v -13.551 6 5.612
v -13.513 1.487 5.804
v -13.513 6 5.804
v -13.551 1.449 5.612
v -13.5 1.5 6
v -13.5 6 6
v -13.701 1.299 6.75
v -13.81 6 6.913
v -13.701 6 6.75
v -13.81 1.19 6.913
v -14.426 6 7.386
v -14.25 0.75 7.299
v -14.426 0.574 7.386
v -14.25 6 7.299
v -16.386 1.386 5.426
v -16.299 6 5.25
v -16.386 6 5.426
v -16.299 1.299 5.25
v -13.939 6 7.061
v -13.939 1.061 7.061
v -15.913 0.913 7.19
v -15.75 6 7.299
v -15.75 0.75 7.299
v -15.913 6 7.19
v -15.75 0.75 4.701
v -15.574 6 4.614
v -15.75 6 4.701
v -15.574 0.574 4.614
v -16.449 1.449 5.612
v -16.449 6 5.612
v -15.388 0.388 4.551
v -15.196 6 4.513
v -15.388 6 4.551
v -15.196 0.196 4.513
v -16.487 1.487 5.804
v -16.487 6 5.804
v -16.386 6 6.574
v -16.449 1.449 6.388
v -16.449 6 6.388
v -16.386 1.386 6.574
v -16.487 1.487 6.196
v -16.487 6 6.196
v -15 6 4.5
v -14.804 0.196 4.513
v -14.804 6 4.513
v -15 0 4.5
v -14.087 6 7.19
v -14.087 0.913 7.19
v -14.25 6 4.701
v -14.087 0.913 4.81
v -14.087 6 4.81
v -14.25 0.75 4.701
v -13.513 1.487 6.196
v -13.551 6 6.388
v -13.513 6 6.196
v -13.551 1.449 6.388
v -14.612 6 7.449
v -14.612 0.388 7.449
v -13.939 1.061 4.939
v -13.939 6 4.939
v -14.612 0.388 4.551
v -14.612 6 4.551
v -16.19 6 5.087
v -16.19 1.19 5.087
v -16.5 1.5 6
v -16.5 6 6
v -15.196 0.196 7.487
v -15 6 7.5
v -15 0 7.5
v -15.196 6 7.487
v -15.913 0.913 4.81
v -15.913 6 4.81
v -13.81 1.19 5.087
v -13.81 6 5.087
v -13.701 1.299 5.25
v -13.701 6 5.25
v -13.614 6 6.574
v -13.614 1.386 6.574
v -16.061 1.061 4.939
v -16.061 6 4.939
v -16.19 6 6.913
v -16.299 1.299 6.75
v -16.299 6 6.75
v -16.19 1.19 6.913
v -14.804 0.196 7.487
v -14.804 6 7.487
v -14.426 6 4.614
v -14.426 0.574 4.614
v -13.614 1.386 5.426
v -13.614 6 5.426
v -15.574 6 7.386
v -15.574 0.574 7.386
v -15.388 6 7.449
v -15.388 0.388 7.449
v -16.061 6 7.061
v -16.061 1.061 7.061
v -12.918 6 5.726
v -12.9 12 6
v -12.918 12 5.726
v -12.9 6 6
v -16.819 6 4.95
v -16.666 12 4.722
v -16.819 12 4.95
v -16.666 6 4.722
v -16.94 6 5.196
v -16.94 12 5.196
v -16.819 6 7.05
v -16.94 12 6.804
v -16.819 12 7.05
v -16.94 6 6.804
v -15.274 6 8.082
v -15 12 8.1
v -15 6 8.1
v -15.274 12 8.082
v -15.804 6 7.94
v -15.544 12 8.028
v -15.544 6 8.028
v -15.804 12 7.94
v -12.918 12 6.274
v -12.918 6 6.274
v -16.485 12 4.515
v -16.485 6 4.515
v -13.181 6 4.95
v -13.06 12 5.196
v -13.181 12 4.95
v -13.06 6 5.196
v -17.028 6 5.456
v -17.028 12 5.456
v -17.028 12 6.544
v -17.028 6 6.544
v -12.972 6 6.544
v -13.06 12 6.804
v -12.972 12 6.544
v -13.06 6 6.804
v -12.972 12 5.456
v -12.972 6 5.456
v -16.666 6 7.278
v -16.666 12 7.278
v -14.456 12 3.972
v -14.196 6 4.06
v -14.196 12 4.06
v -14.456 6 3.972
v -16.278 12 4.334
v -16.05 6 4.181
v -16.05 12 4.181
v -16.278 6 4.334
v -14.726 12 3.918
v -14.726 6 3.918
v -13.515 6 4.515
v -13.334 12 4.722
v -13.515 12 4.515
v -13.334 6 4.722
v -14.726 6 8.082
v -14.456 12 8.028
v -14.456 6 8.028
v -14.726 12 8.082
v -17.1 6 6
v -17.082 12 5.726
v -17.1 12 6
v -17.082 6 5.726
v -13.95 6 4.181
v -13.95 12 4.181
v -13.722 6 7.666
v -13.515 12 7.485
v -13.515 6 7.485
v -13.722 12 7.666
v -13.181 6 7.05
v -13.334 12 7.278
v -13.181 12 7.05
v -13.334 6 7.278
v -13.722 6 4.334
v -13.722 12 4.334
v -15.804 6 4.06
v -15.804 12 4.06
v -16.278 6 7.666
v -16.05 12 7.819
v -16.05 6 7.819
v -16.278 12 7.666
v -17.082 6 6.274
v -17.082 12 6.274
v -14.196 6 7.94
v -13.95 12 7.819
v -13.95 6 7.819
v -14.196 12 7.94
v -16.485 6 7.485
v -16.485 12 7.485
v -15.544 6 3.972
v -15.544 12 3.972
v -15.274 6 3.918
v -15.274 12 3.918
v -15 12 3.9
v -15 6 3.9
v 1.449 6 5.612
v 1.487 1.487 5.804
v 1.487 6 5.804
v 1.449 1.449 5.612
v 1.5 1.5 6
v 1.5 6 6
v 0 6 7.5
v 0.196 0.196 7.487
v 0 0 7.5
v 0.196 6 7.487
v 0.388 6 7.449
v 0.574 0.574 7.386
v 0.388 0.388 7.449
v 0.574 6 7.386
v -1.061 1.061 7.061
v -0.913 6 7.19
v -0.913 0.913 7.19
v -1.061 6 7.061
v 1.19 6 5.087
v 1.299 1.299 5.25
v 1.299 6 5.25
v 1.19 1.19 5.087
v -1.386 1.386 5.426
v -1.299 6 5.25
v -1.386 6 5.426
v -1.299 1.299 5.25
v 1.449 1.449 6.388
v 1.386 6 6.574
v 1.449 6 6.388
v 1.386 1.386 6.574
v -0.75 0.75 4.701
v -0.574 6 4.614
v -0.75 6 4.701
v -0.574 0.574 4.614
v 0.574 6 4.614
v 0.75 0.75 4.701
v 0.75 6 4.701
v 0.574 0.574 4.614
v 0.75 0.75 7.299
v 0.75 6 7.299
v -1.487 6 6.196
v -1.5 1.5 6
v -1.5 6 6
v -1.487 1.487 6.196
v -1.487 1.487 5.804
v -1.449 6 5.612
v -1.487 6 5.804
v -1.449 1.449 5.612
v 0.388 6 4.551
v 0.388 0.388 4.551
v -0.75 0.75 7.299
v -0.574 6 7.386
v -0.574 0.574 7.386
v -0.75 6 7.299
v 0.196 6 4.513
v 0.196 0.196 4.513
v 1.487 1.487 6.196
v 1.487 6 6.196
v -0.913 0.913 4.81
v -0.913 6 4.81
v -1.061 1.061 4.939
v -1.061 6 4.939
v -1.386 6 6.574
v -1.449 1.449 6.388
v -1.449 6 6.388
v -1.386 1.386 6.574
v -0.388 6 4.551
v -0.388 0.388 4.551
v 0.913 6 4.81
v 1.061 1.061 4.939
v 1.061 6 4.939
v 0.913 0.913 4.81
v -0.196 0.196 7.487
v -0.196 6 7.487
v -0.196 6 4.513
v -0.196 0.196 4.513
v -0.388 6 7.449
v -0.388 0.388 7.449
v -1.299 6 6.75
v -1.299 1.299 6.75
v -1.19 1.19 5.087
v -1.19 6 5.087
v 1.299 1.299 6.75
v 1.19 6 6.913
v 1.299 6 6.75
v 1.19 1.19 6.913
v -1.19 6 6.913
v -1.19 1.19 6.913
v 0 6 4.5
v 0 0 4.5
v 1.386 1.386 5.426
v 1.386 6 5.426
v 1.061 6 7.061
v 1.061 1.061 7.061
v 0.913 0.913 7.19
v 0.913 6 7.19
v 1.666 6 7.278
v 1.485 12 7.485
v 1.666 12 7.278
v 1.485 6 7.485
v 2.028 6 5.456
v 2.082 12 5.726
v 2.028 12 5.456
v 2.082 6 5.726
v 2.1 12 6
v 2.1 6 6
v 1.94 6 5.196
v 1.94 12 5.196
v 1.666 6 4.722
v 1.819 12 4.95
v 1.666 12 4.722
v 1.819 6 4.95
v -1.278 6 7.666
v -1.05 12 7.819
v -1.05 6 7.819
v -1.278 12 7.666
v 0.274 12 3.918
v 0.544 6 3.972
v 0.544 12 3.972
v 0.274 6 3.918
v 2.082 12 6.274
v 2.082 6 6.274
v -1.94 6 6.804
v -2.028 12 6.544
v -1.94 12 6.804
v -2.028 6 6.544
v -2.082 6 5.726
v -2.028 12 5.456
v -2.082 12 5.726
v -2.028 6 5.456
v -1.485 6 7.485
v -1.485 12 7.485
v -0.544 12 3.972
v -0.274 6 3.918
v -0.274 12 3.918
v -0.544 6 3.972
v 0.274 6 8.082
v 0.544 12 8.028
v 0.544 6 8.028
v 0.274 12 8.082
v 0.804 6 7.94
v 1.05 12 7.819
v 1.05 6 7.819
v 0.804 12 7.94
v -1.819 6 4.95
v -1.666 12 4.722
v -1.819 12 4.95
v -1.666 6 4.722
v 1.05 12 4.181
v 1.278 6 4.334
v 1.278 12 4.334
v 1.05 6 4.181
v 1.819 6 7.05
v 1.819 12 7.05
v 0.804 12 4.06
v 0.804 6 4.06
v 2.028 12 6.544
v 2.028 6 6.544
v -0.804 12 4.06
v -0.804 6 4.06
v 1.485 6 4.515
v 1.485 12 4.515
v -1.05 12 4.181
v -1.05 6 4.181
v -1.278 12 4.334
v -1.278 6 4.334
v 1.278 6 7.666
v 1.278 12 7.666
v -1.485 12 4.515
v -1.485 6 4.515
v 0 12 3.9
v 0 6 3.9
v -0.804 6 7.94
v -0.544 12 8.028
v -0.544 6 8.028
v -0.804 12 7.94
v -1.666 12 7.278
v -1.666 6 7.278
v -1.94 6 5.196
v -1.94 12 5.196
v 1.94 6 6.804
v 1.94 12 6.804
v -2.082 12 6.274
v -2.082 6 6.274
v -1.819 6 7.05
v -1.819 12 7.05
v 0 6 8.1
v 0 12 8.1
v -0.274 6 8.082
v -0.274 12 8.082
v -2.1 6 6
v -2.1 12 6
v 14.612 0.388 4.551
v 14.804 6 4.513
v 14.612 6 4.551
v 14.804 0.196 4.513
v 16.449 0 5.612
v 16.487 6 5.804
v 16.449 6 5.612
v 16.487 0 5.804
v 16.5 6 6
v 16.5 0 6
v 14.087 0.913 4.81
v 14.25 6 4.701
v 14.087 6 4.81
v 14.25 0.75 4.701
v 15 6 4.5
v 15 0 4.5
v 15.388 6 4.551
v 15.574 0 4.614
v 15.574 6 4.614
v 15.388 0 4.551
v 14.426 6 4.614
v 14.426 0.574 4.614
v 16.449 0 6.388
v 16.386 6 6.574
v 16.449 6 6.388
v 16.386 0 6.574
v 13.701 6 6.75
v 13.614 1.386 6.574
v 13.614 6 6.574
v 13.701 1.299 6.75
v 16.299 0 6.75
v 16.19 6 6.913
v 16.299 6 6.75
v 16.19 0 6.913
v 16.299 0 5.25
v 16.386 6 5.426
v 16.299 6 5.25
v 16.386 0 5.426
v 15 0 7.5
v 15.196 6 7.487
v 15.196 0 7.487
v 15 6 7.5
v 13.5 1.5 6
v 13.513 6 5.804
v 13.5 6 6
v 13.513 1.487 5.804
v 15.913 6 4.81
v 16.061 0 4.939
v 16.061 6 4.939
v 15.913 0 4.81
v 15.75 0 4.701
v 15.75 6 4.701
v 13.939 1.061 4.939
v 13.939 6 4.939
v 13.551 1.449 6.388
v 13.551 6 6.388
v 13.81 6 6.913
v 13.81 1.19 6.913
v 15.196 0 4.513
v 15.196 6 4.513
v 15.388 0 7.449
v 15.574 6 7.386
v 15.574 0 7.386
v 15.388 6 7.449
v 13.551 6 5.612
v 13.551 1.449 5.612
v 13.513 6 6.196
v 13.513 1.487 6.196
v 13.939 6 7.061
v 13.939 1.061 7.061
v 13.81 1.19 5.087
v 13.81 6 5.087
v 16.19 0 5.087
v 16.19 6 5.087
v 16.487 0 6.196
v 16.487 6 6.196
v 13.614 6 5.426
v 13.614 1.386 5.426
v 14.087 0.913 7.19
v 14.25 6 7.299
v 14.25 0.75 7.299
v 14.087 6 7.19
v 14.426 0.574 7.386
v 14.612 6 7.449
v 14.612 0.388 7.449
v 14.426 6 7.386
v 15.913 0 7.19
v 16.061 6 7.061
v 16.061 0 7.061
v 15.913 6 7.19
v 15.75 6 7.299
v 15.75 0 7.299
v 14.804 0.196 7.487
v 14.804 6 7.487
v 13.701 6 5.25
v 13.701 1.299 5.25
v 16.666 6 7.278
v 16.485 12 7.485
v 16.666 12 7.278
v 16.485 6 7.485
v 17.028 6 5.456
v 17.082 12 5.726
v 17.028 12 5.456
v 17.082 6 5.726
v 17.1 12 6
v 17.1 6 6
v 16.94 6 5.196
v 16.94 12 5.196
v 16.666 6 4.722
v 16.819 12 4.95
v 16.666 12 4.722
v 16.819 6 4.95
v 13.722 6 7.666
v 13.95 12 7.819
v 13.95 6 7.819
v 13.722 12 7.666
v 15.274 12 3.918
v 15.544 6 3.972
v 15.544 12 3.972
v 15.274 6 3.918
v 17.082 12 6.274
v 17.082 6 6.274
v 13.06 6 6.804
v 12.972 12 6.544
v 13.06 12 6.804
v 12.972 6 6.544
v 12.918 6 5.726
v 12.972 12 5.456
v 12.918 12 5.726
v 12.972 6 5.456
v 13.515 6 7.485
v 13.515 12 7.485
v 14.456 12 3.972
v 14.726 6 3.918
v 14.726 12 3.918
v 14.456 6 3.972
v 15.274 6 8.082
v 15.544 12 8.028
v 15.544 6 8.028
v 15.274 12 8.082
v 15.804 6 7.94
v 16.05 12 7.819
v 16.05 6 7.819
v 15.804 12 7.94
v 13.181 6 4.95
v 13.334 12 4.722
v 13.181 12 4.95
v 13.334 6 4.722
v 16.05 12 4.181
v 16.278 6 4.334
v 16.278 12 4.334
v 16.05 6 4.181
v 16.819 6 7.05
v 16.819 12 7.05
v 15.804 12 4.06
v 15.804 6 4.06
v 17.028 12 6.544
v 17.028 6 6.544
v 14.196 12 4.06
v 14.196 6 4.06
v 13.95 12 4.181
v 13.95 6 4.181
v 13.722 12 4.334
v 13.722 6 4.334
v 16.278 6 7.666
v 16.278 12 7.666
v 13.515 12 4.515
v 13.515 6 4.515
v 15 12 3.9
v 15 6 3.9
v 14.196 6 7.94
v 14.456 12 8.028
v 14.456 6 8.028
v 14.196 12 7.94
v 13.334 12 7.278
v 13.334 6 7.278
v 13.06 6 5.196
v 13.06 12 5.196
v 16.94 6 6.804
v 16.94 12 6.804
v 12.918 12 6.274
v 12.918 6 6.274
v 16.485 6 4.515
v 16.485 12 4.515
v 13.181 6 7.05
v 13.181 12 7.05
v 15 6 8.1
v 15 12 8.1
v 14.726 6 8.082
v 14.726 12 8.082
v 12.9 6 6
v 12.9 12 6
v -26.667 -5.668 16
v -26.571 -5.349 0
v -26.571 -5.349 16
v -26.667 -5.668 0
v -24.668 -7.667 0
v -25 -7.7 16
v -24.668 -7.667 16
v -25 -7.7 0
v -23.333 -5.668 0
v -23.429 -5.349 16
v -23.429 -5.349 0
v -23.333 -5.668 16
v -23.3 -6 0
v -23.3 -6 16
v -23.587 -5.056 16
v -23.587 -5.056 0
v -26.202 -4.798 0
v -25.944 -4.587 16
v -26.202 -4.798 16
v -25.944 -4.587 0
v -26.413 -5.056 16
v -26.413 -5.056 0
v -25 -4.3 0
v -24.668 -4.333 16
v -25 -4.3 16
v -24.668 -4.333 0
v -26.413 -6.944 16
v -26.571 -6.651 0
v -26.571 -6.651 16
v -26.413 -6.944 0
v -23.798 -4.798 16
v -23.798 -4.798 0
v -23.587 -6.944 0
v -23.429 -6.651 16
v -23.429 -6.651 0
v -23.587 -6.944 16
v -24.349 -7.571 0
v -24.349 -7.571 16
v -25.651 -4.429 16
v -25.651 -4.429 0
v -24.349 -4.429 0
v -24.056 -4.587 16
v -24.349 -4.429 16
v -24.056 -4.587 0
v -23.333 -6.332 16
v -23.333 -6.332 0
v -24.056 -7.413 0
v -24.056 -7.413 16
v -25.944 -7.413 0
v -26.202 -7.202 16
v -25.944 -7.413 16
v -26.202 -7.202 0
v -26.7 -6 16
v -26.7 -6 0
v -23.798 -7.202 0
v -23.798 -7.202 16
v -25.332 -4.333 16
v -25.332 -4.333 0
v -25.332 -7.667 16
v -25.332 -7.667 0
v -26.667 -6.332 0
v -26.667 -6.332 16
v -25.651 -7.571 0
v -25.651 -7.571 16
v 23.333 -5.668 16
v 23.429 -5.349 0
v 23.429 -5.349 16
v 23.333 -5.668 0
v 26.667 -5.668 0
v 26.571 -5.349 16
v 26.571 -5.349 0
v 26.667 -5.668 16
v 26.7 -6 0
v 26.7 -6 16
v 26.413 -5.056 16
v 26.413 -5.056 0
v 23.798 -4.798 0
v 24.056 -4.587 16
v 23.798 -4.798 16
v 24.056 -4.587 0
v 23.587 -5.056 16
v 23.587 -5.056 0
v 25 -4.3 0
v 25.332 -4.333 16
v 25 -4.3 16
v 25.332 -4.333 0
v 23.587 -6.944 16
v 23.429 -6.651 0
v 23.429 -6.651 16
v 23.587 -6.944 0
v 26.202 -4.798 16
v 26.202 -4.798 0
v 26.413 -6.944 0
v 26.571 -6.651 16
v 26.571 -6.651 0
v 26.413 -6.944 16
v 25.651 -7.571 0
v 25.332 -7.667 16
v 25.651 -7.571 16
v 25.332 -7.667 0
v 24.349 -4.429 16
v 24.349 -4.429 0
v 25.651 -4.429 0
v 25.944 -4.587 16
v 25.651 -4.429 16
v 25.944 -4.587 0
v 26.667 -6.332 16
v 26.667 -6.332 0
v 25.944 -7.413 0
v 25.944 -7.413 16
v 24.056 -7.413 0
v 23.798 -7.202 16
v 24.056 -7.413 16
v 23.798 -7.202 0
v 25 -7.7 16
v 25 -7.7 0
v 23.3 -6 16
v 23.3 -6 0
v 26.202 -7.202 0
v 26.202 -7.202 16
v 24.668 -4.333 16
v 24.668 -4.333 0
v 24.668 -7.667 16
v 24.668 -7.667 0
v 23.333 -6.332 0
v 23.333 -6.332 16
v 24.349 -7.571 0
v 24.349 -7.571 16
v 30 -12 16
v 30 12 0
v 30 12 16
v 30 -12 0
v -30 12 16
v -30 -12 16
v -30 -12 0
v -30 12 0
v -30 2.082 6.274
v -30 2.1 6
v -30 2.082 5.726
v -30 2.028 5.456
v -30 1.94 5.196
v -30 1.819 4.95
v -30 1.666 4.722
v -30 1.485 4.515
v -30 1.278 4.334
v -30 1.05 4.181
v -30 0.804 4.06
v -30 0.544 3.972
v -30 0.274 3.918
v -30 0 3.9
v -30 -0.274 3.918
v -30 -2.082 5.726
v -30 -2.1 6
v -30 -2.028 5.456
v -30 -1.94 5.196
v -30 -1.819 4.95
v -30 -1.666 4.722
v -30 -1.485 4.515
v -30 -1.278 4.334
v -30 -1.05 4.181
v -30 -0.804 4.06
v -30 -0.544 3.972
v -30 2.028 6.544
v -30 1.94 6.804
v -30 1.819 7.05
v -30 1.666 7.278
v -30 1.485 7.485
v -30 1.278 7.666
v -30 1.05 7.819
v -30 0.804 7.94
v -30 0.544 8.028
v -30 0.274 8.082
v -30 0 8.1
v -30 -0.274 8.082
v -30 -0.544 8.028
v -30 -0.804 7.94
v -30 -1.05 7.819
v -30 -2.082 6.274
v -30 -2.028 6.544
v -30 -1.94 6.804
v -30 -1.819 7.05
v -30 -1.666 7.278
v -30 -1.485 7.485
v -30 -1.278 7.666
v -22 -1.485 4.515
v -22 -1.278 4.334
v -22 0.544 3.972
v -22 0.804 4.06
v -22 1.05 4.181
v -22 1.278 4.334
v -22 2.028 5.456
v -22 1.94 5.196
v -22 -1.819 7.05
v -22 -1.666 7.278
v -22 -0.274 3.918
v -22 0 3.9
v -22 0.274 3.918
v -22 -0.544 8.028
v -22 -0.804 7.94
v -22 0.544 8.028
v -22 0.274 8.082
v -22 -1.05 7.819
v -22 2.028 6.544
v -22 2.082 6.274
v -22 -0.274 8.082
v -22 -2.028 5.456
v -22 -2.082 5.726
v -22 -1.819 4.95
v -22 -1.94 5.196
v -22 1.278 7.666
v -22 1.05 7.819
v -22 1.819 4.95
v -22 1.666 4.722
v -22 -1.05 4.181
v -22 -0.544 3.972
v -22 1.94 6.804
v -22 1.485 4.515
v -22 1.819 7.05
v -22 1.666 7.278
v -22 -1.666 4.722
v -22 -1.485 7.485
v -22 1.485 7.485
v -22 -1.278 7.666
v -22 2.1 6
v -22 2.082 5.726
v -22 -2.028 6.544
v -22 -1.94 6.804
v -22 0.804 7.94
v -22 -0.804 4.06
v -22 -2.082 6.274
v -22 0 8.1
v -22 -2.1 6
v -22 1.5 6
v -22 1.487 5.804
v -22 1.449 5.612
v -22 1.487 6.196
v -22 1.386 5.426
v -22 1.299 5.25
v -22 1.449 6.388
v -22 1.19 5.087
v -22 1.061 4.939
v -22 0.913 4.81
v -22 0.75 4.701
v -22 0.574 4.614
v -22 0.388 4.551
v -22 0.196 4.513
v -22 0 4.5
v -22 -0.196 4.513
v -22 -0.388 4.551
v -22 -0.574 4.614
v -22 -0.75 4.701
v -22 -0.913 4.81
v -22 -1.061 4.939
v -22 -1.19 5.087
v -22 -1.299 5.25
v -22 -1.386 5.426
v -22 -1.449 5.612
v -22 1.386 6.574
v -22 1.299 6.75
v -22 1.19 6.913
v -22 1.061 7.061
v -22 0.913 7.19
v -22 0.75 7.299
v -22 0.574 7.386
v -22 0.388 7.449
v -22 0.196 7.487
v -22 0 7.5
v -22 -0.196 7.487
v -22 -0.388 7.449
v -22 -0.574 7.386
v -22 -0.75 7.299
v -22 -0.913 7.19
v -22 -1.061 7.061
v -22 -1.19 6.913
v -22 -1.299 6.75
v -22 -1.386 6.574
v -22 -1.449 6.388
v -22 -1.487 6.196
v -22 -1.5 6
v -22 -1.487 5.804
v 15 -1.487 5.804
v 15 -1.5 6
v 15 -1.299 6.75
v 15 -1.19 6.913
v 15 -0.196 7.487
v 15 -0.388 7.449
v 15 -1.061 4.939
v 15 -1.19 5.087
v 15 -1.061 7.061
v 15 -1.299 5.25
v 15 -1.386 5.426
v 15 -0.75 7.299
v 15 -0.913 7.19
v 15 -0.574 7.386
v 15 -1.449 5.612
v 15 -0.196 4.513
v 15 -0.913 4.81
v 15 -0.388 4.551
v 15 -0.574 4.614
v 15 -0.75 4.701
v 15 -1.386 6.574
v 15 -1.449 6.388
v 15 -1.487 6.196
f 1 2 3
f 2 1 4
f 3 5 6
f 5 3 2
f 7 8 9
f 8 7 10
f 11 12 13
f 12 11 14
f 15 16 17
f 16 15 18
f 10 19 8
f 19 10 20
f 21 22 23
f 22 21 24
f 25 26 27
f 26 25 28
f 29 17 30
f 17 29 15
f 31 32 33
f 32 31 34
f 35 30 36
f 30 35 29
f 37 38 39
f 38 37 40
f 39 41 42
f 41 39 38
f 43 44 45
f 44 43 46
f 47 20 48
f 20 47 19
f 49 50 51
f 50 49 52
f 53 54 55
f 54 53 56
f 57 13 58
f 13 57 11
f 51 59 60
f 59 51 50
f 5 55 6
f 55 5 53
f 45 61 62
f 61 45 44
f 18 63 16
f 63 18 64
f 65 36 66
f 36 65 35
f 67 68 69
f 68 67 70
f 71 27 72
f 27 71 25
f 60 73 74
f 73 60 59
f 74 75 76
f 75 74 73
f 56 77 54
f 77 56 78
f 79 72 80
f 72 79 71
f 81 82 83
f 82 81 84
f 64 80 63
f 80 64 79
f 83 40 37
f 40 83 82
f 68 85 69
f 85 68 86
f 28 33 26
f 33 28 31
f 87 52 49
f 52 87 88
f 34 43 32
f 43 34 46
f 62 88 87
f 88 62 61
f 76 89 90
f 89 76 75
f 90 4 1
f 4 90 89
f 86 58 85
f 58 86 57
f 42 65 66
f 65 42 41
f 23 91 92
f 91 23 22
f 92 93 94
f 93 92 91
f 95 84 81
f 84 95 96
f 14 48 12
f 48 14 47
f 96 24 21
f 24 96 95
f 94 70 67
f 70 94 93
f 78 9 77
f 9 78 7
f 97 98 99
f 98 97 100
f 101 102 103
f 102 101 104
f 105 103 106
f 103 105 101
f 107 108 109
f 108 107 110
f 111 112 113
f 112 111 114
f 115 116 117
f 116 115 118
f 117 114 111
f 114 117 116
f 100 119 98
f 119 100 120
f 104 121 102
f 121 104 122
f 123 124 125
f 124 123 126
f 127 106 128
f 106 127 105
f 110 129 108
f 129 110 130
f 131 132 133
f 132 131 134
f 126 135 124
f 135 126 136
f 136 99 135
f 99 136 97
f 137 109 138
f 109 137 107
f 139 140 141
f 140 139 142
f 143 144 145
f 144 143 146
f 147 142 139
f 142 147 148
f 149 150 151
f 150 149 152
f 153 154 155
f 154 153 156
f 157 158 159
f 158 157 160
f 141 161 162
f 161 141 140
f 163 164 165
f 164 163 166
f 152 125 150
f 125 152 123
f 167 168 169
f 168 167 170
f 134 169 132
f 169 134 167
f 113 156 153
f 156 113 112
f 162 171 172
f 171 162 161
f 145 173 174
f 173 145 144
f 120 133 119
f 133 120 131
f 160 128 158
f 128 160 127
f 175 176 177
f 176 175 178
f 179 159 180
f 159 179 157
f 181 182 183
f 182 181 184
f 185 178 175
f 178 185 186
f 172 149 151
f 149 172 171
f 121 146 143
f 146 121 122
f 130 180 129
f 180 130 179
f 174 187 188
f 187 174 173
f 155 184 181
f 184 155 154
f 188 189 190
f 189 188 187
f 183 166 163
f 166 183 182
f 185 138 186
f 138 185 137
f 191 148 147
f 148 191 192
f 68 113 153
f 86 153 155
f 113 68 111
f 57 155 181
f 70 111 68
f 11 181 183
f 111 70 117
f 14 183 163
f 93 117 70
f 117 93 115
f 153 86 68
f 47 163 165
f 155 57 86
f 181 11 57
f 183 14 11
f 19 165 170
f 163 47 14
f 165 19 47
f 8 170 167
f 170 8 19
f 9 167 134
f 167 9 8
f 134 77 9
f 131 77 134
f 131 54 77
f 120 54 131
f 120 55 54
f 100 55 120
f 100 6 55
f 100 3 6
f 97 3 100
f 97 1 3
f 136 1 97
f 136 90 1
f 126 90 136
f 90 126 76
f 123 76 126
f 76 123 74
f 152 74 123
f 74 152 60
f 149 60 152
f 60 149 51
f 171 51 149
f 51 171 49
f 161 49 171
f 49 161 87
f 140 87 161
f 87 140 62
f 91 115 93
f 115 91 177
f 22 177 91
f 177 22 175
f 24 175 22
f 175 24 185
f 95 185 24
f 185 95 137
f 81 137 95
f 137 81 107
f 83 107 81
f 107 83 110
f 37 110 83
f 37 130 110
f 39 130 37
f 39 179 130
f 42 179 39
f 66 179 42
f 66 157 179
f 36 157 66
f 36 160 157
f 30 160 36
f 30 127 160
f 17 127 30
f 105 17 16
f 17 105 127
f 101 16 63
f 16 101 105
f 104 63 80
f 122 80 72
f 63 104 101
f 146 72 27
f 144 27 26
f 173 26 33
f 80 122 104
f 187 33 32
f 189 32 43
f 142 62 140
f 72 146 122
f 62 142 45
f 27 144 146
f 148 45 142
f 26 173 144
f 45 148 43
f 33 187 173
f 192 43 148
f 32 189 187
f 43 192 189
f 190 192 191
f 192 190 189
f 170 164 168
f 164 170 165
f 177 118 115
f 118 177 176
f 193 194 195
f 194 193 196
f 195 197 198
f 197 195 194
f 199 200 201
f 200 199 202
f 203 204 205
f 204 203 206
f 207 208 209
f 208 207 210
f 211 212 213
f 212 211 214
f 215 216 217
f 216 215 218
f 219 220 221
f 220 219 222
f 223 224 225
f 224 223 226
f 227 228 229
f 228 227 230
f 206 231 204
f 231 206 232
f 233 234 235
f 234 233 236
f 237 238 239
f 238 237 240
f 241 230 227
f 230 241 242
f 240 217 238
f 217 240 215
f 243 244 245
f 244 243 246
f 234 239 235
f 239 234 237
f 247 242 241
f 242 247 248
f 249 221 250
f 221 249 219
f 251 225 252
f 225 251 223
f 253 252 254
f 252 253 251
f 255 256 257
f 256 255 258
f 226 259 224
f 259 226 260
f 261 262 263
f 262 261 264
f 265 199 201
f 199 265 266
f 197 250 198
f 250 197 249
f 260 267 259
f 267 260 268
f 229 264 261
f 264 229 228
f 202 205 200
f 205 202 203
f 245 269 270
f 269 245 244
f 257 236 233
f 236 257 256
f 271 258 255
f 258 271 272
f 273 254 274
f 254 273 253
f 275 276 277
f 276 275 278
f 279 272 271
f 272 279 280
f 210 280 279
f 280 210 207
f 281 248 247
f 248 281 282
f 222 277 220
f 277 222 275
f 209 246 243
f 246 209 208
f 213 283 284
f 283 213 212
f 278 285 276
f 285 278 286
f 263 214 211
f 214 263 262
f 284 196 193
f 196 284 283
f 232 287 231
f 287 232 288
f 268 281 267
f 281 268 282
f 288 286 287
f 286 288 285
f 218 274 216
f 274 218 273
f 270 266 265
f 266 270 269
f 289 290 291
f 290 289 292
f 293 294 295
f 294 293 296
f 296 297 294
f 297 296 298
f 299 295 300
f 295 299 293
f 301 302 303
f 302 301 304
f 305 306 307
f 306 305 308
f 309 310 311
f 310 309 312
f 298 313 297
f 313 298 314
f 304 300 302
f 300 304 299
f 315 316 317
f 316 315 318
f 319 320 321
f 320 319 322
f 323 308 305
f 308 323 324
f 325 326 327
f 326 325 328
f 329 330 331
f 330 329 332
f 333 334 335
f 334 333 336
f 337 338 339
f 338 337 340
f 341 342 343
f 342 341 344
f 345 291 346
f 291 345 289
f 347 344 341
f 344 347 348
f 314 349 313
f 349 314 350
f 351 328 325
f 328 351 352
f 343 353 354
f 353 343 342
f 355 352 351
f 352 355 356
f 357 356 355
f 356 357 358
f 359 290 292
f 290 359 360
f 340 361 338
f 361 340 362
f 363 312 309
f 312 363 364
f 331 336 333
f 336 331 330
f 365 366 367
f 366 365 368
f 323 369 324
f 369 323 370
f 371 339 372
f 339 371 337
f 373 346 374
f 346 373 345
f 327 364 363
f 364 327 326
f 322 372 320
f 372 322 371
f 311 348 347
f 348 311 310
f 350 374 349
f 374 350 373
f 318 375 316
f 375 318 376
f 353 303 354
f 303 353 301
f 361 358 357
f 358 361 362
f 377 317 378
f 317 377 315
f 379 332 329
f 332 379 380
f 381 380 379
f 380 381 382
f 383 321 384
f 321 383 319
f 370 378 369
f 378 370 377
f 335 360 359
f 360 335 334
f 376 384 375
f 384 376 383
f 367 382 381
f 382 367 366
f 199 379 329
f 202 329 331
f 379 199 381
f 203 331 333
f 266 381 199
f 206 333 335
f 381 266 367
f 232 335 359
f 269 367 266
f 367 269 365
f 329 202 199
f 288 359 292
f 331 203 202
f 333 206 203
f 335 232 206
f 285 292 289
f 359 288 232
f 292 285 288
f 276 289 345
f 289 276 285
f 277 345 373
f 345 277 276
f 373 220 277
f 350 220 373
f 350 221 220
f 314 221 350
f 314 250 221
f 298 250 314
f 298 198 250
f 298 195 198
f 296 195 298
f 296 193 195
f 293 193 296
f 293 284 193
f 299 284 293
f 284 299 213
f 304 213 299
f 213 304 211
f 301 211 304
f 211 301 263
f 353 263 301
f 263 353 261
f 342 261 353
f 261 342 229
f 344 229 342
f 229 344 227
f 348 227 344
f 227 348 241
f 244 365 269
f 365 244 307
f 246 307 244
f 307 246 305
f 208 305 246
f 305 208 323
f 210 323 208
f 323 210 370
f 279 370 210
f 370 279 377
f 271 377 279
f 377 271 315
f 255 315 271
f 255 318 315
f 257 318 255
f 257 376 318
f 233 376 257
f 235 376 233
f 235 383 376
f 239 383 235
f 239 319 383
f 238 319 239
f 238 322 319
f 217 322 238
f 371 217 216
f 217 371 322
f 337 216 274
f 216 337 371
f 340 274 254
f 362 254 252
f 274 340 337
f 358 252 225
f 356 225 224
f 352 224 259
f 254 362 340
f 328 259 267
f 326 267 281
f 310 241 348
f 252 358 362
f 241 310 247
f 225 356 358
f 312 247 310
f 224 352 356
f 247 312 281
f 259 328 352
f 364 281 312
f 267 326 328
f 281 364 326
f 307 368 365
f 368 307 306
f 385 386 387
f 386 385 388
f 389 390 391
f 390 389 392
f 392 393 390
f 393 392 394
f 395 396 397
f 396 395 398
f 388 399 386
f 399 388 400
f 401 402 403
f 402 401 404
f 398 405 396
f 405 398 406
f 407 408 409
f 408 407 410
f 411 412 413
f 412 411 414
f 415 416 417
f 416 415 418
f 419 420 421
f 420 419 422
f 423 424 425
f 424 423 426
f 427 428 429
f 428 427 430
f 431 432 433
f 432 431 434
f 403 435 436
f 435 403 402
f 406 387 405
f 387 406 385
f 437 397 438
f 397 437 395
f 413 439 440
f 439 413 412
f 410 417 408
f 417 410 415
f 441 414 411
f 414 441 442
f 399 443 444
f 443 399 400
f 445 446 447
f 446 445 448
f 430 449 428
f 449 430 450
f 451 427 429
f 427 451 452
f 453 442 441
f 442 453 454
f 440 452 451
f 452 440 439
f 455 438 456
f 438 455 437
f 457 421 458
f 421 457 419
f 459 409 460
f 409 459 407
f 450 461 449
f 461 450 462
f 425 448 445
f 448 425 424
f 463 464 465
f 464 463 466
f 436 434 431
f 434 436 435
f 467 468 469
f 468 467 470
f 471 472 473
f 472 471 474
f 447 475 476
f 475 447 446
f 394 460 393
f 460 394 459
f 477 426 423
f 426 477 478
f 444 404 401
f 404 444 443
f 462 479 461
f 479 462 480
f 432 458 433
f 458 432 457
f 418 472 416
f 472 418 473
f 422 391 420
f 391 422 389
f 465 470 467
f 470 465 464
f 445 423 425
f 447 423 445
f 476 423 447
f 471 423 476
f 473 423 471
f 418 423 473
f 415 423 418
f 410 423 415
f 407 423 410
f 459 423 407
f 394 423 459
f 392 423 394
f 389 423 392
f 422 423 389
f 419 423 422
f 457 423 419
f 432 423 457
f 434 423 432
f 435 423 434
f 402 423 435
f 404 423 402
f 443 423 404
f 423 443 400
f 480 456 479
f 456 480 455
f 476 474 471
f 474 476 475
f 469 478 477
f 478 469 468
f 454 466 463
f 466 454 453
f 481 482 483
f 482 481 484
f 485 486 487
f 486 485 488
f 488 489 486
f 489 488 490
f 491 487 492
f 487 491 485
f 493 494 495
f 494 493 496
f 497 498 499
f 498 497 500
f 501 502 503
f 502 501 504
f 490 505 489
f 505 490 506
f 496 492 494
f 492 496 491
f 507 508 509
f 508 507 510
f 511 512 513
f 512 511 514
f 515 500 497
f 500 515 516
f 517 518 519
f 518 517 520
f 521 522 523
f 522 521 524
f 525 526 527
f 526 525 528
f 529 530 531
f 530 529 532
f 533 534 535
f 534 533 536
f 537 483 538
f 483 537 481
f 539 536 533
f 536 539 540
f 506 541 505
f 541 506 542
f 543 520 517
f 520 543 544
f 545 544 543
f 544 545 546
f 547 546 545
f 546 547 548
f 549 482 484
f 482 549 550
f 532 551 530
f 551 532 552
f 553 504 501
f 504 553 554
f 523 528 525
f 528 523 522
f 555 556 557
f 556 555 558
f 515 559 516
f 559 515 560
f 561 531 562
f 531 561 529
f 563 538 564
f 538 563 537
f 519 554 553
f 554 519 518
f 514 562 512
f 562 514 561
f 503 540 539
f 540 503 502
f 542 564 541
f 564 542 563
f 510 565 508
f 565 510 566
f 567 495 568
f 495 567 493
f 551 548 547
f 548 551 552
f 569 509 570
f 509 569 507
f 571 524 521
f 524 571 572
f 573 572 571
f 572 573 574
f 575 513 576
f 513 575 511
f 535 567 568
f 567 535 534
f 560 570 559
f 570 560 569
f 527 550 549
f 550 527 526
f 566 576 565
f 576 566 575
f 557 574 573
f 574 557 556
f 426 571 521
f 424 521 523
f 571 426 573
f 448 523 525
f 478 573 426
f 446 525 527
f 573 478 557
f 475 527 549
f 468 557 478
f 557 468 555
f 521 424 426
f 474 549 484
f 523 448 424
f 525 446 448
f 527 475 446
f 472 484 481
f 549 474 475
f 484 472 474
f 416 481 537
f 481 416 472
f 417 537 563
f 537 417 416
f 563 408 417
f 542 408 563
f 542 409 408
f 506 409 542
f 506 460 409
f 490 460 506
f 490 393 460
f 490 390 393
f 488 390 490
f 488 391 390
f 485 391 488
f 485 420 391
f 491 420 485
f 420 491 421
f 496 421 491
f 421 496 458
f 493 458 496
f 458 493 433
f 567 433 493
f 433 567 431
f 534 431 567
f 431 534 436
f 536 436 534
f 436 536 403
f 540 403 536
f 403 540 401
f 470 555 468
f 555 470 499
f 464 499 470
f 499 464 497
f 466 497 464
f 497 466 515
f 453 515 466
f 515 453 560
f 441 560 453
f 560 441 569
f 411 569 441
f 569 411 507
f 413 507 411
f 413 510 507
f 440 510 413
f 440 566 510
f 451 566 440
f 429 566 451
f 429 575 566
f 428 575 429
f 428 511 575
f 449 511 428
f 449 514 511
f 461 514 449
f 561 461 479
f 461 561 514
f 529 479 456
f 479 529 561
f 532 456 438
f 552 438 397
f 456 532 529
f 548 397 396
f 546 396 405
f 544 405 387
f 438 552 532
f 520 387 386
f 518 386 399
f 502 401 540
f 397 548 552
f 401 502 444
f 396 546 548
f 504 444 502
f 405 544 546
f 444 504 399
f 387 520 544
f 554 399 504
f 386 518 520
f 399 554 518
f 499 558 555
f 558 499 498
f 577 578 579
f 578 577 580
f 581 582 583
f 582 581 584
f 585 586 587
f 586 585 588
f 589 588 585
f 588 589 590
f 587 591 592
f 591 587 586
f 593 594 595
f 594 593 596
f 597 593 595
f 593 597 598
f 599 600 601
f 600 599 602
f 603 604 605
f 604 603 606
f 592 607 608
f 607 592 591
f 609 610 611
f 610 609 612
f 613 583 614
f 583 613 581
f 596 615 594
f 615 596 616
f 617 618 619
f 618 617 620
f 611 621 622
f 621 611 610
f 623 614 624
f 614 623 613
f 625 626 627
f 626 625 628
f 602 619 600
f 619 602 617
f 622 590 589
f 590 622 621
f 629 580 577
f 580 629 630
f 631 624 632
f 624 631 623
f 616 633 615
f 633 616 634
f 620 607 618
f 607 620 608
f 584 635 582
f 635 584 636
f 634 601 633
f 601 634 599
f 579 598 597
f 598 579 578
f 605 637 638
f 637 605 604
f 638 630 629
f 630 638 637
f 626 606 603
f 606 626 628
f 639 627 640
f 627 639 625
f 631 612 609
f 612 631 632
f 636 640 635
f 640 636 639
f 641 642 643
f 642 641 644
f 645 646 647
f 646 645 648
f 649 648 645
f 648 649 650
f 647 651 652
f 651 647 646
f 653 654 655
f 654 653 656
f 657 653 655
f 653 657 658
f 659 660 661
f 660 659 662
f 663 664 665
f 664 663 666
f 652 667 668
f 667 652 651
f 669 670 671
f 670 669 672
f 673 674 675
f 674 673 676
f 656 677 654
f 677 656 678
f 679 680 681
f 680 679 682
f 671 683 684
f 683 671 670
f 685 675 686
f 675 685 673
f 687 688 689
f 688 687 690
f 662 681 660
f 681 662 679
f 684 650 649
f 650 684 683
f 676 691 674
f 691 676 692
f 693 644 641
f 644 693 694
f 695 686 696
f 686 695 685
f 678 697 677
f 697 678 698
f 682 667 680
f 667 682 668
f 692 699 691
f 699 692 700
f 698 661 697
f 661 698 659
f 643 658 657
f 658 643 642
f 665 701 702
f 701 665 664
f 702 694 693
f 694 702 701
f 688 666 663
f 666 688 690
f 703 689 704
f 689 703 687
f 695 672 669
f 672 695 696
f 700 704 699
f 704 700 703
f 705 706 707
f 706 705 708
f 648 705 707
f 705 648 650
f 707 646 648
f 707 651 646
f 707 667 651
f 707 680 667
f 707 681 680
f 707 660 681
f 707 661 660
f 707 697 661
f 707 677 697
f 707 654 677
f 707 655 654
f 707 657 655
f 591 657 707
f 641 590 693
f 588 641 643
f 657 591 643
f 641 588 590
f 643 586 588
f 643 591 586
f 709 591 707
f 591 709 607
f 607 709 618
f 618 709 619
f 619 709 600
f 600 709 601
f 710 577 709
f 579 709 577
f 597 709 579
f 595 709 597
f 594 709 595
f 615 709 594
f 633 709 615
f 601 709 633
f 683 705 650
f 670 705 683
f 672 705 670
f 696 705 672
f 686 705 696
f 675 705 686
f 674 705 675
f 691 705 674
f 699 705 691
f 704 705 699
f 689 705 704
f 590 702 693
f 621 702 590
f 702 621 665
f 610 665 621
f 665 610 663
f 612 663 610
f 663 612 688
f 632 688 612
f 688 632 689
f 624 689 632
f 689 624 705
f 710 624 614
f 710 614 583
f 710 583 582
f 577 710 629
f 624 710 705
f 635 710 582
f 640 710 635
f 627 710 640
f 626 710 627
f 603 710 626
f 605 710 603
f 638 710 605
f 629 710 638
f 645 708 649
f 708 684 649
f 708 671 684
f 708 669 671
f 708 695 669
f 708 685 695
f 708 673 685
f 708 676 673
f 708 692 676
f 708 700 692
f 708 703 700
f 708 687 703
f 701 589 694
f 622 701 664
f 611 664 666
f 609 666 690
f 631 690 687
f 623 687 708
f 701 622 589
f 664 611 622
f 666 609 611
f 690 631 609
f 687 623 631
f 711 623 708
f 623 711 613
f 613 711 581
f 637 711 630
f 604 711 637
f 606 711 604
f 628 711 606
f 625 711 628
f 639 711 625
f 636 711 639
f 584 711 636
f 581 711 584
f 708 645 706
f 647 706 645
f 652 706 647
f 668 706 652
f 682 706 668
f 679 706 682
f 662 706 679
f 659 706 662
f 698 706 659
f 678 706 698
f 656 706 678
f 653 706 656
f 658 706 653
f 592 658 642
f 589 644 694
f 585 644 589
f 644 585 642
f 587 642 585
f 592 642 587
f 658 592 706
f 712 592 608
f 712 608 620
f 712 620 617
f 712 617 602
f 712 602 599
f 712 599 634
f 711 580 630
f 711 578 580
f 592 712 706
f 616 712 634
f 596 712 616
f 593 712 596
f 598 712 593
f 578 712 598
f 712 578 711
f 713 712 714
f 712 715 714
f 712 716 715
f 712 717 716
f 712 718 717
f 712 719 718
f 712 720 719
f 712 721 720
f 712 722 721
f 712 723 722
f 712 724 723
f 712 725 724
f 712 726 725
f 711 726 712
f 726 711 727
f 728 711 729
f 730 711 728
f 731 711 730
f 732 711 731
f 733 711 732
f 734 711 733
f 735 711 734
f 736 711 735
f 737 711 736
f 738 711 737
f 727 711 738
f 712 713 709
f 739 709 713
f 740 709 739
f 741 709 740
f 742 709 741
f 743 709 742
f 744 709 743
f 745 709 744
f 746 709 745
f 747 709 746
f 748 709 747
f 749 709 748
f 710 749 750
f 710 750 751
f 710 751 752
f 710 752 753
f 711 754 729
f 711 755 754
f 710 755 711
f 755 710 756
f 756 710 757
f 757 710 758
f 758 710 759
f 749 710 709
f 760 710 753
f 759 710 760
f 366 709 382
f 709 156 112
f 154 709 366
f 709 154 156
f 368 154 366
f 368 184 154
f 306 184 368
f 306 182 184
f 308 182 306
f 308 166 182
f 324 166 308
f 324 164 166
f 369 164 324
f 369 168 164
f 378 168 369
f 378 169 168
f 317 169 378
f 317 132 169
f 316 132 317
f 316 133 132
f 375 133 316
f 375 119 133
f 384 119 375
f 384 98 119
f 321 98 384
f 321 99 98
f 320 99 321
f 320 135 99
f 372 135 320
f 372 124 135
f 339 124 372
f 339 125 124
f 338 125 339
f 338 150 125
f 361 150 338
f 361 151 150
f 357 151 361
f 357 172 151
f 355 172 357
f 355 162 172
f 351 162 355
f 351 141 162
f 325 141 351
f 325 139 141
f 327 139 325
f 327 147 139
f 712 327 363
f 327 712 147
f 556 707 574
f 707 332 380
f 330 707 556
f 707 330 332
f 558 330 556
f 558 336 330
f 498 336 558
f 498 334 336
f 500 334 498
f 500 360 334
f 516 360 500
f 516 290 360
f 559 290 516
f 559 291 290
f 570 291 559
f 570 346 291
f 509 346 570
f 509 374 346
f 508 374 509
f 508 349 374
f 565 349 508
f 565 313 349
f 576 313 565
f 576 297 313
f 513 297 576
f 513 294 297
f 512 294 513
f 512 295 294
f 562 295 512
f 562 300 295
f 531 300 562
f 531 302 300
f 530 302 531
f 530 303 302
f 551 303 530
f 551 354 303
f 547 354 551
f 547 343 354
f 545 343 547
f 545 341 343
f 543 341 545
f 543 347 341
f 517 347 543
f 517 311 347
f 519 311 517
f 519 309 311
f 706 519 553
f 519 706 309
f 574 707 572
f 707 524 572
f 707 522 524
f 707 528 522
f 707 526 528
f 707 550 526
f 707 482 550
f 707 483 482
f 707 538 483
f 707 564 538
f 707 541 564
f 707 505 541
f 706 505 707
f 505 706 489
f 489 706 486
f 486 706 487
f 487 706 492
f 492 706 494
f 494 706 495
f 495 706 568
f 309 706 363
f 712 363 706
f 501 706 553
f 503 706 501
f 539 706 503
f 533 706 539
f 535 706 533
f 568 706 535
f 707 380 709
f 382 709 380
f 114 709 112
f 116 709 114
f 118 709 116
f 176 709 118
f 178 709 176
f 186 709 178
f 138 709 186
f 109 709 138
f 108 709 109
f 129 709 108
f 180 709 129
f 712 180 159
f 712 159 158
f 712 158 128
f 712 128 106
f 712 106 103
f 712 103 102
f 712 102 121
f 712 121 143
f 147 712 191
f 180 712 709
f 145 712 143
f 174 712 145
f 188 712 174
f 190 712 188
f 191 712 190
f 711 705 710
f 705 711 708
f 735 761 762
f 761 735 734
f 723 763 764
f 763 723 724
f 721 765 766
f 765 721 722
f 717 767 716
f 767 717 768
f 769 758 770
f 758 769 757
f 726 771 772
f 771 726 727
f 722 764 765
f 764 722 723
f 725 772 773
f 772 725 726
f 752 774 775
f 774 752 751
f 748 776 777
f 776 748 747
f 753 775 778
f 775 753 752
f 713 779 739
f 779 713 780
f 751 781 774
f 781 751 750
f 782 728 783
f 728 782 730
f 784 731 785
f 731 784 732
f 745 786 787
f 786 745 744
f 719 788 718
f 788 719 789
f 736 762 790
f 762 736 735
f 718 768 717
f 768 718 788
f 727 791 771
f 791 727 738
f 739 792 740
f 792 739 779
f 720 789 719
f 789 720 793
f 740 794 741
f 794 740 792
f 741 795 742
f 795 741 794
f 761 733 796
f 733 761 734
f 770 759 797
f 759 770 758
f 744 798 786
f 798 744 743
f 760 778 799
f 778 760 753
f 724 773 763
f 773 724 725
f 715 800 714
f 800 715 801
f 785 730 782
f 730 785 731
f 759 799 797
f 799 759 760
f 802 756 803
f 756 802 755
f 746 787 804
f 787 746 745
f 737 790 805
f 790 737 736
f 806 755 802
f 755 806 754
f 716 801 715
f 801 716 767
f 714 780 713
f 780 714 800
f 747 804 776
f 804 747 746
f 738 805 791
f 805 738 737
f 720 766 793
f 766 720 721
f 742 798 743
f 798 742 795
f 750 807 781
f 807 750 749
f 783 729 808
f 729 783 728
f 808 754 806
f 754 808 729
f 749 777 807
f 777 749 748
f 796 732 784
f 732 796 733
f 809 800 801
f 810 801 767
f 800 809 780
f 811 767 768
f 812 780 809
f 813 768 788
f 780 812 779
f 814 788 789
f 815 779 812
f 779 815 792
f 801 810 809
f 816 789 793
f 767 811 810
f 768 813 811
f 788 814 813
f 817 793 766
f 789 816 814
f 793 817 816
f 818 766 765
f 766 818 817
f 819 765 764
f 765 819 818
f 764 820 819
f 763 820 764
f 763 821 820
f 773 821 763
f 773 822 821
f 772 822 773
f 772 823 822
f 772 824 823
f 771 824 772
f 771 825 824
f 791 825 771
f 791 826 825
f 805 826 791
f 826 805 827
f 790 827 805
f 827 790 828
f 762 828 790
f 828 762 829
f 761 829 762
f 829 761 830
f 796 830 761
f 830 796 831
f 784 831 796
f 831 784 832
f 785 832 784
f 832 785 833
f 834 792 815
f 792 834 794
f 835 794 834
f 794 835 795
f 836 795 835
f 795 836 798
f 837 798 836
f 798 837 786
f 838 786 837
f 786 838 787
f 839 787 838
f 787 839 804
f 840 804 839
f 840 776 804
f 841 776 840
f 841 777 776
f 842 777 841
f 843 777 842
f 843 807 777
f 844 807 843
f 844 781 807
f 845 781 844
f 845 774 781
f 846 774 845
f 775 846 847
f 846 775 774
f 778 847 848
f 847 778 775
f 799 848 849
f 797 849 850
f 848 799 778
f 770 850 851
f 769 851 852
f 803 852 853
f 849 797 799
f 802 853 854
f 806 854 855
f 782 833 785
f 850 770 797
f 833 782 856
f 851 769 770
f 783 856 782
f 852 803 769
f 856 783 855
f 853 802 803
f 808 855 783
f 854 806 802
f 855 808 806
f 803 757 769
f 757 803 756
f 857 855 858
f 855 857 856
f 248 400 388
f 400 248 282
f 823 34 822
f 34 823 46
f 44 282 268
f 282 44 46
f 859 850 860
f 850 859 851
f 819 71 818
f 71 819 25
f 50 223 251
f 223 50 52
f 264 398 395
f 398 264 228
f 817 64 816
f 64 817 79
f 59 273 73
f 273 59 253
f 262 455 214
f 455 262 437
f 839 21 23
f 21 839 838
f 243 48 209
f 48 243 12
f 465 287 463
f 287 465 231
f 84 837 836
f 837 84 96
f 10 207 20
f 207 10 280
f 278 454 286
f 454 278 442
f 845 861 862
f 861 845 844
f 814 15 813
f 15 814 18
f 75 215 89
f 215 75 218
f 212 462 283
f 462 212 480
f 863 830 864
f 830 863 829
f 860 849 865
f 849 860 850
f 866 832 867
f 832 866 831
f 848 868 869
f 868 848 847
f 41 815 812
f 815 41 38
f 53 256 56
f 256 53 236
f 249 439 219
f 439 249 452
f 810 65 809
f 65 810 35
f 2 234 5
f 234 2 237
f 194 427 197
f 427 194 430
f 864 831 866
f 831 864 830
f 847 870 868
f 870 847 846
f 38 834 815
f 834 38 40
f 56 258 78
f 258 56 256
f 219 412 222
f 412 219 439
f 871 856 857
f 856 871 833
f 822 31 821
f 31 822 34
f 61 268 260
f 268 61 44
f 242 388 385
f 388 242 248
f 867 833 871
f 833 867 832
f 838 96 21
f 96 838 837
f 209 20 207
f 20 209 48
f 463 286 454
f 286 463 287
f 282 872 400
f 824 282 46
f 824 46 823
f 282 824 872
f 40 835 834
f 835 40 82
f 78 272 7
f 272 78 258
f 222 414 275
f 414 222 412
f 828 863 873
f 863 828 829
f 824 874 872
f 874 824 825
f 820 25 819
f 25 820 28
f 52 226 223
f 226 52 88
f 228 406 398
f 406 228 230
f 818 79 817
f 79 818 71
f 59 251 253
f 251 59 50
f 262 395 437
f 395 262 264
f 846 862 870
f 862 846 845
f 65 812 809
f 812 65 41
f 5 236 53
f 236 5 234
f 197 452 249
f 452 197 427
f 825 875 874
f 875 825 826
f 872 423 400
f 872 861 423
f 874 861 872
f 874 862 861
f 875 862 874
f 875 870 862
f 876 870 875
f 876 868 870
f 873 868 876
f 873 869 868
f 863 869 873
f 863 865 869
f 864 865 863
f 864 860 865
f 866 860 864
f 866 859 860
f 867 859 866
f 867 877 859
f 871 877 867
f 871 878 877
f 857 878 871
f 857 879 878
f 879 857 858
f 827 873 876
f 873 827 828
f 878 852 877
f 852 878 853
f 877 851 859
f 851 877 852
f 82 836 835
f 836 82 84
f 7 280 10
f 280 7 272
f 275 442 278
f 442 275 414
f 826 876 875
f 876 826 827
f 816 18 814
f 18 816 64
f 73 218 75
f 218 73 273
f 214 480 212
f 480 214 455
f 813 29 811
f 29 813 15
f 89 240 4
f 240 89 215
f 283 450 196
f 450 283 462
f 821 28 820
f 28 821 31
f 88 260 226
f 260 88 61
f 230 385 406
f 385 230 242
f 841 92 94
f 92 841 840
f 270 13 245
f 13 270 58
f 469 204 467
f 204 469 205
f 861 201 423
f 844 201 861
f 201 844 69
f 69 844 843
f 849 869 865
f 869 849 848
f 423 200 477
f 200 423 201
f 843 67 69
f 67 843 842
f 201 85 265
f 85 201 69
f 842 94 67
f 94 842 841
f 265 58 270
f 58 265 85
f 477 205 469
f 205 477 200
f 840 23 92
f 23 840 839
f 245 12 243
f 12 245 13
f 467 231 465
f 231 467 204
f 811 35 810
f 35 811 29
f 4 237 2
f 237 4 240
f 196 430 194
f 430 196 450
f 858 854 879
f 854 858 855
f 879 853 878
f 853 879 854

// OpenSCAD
// KNOWN-WRONG PART (must fail): the channels lie at z = 6 instead of the mid-plane z = 8
// Manifold block: one tubing inlet split into three outlets through internal channels
// Category: hardware. 3 mm channels in the mid-plane: an inlet socket on the -X face feeds a main
// channel that ends inside the block; three branches run to sockets on the +Y face.
// Print: PETG, lying on its bottom face, 0.15 mm layers, 100 % infill (watertight walls);
// the 3 mm channels bridge cleanly. Leak-test before use; glue the tubing into the sockets.
// SPDX-License-Identifier: CERN-OHL-P-2.0

/* [Manifold] */
block = [60, 24, 16];     // X, Y, Z [mm], centred in X and Y
ch_z = 6;                 // channel mid-plane
ch_d = 3;
sock_d = 4.2;             // socket for 4 mm OD tubing
inlet_sock = 8;           // inlet socket depth (from the -X face)
outlet_sock = 6;          // outlet socket depth (from the +Y face)
main_end = 15;            // the main channel stops at x = 15
outlets_x = [-15, 0, 15];
screw_d = 3.4;            // M3 clearance
screws = [[-25, -6], [25, -6]];

/* [Hidden] */
eps = 0.01;

difference() {
    translate([-block.x / 2, -block.y / 2, 0]) cube(block);
    // inlet socket and main channel along +X
    translate([-block.x / 2 - 1, 0, ch_z]) rotate([0, 90, 0]) cylinder(d = sock_d, h = inlet_sock + 1, $fn = 48);
    translate([-block.x / 2 - 1, 0, ch_z]) rotate([0, 90, 0]) cylinder(d = ch_d, h = block.x / 2 + main_end + 1, $fn = 48);
    // outlet branches along +Y, each ending in a socket
    for (x = outlets_x) {
        translate([x, 0, ch_z]) rotate([-90, 0, 0]) cylinder(d = ch_d, h = block.y / 2 + 1, $fn = 48);
        translate([x, block.y / 2 - outlet_sock, ch_z]) rotate([-90, 0, 0]) cylinder(d = sock_d, h = outlet_sock + 1, $fn = 48);
    }
    for (p = screws) translate([p.x, p.y, -1]) cylinder(d = screw_d, h = block.z + 2, $fn = 32);
}
